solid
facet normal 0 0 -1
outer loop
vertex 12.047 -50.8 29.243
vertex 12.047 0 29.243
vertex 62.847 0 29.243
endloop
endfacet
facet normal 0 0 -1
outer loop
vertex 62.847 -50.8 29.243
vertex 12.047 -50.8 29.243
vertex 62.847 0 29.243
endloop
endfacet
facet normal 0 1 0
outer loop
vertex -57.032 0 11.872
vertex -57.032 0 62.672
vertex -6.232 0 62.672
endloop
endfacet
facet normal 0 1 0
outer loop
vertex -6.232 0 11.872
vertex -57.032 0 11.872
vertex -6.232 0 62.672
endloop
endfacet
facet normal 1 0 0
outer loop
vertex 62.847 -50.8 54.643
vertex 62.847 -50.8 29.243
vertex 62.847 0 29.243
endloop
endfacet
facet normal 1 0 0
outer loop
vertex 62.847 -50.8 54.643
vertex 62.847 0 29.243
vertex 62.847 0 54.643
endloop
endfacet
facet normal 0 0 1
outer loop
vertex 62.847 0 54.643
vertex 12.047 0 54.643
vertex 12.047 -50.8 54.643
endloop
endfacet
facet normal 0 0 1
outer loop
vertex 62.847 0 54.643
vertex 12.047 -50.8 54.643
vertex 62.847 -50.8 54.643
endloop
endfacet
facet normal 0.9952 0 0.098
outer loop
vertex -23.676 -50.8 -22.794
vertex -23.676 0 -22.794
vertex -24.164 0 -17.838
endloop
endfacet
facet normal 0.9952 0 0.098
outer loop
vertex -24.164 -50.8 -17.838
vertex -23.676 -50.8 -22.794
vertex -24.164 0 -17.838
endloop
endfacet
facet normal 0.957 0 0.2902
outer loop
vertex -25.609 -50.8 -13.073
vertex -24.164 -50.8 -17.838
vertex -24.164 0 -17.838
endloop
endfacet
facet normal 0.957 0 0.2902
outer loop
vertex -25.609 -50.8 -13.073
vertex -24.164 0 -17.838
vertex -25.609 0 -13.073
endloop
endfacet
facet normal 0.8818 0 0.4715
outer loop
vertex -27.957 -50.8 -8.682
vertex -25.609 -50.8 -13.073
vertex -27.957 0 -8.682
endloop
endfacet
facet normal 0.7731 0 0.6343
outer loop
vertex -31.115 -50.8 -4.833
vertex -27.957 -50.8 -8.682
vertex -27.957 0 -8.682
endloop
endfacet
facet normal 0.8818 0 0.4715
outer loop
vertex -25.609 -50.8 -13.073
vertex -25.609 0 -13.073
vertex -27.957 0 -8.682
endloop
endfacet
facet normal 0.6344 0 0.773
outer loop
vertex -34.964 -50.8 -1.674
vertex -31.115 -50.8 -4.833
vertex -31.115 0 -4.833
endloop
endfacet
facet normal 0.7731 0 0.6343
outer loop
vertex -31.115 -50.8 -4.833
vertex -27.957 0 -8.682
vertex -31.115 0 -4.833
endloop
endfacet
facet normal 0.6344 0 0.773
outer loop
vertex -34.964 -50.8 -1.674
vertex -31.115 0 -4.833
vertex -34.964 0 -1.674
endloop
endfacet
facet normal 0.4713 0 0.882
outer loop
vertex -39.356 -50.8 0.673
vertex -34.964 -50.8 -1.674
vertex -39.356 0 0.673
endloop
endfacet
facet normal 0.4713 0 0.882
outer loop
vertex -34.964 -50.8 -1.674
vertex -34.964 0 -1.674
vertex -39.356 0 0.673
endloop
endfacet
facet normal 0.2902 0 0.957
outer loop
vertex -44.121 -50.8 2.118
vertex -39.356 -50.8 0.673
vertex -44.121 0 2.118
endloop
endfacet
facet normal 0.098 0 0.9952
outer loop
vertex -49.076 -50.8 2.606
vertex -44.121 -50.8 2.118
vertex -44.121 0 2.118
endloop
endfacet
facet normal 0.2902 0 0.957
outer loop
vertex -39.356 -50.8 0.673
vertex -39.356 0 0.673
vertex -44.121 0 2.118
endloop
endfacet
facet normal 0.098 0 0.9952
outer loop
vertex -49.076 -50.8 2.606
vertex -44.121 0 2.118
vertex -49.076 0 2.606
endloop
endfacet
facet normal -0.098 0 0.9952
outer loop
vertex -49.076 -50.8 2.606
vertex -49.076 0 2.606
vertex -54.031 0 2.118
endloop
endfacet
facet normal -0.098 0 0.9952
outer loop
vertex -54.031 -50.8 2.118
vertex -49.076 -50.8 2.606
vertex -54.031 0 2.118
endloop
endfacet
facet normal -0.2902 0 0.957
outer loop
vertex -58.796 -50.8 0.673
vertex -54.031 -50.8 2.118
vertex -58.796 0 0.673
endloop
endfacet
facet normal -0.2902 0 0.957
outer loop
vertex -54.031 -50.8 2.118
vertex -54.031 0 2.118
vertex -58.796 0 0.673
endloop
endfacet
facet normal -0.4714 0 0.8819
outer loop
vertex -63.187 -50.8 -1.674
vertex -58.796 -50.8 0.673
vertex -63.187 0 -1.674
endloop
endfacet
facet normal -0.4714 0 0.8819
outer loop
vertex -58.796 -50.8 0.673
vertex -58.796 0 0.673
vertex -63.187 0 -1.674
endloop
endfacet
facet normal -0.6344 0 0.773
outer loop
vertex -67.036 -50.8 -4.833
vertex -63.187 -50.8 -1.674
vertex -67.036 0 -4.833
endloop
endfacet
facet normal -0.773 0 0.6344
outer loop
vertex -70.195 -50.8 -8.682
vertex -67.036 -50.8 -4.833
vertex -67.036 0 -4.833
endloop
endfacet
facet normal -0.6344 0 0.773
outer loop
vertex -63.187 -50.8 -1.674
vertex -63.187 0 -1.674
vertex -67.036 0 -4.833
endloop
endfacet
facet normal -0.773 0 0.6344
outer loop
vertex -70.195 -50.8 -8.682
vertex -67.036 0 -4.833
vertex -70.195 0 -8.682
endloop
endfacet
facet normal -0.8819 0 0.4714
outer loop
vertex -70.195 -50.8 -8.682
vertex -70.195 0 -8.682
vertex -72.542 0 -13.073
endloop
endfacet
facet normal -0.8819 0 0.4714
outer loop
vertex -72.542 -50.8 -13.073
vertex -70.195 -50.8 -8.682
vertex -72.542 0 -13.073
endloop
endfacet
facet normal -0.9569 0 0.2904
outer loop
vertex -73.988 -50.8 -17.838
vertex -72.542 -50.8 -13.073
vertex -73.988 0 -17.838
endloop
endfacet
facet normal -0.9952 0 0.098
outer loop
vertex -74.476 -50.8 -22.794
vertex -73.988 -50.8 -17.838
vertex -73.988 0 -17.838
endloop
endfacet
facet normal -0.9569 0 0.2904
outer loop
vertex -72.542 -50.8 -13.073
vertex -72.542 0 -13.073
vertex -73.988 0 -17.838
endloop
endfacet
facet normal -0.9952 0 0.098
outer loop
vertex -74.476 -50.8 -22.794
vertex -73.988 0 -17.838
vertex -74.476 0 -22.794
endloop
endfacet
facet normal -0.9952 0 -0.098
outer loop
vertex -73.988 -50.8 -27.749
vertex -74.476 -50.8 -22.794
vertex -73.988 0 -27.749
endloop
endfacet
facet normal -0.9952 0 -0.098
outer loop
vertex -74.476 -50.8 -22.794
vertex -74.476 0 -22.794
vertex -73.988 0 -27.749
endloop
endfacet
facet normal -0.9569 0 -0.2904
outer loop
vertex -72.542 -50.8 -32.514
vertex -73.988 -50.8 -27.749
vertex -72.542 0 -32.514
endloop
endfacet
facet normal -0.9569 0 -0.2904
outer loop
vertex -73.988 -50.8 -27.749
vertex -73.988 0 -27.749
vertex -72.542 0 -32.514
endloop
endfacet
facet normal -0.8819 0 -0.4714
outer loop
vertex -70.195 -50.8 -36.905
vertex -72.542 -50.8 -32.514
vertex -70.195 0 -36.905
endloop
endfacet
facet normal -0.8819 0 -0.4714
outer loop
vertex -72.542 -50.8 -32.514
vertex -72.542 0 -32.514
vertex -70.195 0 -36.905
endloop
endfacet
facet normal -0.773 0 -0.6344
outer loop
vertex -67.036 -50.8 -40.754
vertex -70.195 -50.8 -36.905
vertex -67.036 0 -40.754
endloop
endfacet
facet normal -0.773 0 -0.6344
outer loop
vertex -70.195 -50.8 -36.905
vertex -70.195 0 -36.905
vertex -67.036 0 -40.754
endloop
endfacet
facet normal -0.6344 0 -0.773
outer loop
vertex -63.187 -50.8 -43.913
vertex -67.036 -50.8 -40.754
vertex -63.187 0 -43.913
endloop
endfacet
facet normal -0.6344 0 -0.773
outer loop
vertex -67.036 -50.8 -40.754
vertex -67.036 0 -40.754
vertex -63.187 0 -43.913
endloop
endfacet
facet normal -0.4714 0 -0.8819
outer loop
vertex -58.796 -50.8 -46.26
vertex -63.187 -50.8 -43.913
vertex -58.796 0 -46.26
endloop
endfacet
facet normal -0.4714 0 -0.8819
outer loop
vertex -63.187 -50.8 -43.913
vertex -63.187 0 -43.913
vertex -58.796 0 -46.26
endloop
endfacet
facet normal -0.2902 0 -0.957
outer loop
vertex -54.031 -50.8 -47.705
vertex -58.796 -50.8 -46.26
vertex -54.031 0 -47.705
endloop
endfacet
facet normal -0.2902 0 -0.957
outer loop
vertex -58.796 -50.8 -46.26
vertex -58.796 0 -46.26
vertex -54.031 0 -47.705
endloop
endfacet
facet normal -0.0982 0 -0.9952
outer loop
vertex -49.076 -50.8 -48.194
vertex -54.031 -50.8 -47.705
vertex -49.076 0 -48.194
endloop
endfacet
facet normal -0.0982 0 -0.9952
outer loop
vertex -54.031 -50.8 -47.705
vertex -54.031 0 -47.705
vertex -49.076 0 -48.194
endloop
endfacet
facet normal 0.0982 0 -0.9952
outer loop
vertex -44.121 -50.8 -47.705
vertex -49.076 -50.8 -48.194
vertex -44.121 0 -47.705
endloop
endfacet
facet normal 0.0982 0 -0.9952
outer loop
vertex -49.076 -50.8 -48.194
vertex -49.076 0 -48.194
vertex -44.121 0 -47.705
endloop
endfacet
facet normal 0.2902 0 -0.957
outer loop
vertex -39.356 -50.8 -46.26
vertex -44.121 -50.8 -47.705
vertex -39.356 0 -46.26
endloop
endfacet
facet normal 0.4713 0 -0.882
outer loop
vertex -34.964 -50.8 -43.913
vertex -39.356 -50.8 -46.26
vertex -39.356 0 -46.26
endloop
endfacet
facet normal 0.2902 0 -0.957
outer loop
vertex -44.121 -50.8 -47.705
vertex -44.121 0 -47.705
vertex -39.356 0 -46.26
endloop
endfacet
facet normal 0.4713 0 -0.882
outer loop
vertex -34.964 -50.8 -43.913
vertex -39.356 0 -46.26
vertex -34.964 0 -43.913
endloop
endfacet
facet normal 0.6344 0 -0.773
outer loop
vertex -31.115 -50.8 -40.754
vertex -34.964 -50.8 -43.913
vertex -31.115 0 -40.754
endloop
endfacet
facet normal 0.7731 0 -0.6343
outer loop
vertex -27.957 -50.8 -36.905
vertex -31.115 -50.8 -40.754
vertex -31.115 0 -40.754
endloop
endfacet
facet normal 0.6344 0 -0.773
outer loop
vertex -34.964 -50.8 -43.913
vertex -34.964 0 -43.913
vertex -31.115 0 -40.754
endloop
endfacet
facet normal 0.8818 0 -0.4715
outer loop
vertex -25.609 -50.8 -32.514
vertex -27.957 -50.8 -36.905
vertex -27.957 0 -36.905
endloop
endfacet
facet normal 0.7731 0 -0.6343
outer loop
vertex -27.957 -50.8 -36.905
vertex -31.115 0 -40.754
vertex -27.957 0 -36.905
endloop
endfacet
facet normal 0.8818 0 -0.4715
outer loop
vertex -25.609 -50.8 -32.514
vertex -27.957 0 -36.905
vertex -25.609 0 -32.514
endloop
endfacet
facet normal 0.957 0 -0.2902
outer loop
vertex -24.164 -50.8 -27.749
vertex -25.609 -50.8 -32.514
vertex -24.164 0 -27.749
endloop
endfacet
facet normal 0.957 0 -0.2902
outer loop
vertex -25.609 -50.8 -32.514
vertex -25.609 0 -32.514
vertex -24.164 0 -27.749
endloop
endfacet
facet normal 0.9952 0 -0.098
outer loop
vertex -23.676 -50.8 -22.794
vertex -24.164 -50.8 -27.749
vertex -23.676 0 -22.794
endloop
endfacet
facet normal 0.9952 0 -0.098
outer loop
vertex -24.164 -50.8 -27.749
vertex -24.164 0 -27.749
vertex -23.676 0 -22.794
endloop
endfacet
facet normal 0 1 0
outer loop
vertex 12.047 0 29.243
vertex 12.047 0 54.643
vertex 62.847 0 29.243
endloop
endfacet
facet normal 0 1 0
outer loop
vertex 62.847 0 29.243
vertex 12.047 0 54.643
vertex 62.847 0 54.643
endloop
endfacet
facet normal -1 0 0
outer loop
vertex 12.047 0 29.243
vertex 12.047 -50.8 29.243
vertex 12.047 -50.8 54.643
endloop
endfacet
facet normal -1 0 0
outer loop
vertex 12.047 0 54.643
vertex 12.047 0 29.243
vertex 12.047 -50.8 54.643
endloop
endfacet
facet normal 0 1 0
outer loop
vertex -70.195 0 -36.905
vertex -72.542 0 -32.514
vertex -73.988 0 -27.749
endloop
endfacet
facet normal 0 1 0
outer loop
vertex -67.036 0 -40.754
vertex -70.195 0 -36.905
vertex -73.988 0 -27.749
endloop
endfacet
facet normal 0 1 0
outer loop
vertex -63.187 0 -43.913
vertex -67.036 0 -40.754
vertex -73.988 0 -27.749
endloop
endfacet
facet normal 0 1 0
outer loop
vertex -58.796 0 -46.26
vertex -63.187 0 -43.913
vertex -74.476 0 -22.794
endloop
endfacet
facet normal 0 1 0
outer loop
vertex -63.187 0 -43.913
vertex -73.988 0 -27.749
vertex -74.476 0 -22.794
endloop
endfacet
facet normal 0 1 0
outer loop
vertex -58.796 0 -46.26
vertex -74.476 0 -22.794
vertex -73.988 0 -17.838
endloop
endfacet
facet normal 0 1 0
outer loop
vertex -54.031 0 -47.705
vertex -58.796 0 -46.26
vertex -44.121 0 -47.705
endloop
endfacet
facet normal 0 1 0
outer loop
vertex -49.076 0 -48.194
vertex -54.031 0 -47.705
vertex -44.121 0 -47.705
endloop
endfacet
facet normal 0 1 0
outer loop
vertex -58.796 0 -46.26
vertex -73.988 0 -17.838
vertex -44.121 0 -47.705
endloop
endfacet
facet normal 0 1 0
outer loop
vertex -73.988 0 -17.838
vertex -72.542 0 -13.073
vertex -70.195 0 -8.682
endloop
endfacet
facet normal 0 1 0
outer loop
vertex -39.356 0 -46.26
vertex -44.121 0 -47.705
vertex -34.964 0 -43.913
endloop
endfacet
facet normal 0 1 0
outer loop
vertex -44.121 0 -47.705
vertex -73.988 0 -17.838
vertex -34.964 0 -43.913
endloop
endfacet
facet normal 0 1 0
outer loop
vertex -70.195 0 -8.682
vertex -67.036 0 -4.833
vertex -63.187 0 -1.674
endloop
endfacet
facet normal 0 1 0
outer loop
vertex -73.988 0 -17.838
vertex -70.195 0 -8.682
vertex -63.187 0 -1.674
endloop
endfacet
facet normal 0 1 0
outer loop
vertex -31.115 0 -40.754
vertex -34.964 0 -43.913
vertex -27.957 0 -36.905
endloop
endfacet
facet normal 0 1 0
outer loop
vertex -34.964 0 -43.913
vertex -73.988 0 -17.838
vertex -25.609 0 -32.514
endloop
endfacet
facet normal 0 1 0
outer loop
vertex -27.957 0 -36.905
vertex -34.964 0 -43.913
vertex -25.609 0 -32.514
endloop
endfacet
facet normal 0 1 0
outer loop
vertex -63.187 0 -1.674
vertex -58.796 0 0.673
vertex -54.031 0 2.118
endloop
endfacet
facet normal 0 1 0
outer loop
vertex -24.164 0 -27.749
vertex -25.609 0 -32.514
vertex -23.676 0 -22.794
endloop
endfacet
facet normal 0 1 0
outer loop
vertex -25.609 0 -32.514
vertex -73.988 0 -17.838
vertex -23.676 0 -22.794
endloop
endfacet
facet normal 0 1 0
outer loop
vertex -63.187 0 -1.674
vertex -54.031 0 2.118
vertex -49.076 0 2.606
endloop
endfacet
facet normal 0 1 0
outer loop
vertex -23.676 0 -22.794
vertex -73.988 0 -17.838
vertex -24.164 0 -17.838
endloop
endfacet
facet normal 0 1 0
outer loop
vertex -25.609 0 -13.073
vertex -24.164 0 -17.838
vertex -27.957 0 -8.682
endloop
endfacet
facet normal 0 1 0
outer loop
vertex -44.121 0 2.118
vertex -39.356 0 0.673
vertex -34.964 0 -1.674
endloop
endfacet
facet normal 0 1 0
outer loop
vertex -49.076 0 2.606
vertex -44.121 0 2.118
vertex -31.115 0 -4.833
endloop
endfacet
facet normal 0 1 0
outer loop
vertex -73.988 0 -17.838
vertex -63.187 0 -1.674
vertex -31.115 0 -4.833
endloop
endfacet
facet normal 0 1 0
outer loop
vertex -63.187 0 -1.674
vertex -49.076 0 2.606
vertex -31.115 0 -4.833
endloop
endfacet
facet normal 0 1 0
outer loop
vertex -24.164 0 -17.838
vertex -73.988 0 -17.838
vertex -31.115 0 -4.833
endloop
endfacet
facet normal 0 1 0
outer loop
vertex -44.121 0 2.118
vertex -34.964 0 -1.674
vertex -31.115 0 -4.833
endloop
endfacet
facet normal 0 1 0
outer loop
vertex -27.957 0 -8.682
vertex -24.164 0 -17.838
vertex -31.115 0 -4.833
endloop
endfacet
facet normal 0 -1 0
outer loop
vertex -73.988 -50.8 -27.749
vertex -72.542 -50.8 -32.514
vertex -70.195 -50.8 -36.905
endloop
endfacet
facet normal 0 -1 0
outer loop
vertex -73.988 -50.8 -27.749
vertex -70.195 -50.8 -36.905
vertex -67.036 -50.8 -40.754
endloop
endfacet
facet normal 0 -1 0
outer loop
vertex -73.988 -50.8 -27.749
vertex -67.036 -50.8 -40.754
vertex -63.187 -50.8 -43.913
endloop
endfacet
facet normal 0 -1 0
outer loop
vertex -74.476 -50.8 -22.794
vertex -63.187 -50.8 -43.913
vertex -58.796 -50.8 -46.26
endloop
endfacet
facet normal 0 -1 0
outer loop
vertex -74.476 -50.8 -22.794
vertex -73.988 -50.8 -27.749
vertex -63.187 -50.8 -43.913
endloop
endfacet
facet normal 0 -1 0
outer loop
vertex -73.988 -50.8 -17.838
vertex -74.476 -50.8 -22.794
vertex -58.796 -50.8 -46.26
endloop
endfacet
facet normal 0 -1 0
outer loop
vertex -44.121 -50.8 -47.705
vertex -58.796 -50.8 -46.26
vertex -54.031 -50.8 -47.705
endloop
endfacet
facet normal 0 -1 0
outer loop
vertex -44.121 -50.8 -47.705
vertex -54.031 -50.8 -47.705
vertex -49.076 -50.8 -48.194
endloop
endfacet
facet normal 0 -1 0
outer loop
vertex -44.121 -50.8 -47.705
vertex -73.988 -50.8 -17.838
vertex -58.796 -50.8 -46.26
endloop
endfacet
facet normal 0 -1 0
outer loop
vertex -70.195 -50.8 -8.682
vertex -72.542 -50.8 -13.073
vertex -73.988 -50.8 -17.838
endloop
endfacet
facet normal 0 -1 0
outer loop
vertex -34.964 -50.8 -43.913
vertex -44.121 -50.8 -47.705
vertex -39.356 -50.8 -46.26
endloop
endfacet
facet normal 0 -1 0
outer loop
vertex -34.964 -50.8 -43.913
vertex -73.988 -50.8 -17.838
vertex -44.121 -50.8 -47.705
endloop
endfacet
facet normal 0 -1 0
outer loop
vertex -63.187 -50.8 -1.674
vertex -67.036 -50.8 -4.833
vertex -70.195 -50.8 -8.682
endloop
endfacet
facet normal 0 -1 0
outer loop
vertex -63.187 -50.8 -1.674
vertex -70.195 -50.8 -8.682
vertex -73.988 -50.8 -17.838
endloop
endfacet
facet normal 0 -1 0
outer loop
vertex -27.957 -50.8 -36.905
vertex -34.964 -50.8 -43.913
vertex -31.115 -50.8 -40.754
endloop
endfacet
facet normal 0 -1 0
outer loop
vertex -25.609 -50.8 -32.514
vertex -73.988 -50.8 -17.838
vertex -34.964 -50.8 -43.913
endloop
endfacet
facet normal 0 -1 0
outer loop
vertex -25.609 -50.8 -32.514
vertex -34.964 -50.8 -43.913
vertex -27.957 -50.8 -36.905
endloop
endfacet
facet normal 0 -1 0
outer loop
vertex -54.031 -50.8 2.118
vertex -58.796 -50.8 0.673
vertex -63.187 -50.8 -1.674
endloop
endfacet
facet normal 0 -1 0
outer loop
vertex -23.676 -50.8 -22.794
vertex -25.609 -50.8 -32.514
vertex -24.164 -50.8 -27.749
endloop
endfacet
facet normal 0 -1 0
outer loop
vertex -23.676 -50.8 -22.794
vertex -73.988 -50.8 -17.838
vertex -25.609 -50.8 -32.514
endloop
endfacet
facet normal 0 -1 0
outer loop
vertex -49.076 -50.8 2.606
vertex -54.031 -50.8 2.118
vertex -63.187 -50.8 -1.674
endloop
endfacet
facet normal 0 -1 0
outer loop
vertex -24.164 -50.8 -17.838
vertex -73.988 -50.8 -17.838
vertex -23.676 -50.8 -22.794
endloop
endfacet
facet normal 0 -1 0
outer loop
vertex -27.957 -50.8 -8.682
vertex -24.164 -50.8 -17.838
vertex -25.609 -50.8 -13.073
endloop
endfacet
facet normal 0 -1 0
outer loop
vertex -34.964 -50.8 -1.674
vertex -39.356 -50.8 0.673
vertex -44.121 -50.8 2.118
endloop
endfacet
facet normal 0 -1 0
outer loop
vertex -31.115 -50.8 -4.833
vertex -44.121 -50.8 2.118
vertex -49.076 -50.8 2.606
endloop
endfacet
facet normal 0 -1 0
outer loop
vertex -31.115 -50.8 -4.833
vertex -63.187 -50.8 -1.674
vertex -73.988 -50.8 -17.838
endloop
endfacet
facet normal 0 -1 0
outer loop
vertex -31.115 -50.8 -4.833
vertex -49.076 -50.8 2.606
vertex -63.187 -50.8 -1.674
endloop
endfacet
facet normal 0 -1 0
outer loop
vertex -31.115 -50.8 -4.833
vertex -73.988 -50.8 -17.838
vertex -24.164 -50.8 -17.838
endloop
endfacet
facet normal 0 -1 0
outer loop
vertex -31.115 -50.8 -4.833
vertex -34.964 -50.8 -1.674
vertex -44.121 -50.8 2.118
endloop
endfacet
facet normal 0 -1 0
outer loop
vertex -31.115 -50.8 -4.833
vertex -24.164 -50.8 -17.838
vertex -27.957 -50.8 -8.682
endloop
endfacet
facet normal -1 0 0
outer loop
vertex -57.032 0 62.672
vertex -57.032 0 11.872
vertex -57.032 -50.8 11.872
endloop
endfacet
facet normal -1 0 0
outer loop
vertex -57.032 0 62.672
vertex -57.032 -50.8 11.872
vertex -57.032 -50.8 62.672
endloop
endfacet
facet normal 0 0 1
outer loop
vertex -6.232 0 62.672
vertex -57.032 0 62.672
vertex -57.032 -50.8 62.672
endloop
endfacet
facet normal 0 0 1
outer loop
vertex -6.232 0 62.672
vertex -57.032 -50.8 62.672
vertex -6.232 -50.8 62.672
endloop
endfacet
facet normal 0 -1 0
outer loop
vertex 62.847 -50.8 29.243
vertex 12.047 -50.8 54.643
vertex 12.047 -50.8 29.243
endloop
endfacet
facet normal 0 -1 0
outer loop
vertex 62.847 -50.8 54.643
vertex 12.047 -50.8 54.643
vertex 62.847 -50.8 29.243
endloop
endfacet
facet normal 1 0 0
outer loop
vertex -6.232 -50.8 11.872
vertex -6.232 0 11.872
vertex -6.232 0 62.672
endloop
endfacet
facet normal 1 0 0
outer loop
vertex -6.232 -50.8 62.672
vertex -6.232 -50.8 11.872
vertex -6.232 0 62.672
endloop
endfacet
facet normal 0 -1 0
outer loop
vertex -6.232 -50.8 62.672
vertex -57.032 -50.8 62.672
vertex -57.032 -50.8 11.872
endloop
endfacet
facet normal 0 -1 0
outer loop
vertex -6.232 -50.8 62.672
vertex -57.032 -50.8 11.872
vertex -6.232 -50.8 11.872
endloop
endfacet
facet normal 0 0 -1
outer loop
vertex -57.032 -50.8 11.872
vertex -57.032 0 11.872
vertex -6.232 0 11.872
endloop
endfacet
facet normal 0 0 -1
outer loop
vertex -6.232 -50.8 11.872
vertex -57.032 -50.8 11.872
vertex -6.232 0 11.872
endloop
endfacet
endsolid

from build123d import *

# Parameters (mm, degrees)
F0_W     = 50.8
F0_H     = 50.8
F3_DEPTH = 50.8
F1_W     = 50.8
F1_H     = 25.4
F4_DEPTH = 50.8
F2_R     = 25.4
F5_DEPTH = 50.8


with BuildPart() as f3:
    # F0 (on Front) → F3 (new body)
    with BuildSketch(Plane.XZ):
        with Locations((-31.631861, 37.272409)):
            Rectangle(F0_W, F0_H)
    extrude(amount=F3_DEPTH)


with BuildPart() as f4:
    # F1 (on Front) → F4 (new body)
    with BuildSketch(Plane.XZ):
        with Locations((37.44654, 41.94254)):
            Rectangle(F1_W, F1_H)
    extrude(amount=F4_DEPTH)


with BuildPart() as f5:
    # F2 (on Front) → F5 (new body)
    with BuildSketch(Plane.XZ):
        with Locations((-49.075902, -22.793546)):
            Circle(F2_R)
    extrude(amount=F5_DEPTH)


solid = Compound([f3.part, f4.part, f5.part])
